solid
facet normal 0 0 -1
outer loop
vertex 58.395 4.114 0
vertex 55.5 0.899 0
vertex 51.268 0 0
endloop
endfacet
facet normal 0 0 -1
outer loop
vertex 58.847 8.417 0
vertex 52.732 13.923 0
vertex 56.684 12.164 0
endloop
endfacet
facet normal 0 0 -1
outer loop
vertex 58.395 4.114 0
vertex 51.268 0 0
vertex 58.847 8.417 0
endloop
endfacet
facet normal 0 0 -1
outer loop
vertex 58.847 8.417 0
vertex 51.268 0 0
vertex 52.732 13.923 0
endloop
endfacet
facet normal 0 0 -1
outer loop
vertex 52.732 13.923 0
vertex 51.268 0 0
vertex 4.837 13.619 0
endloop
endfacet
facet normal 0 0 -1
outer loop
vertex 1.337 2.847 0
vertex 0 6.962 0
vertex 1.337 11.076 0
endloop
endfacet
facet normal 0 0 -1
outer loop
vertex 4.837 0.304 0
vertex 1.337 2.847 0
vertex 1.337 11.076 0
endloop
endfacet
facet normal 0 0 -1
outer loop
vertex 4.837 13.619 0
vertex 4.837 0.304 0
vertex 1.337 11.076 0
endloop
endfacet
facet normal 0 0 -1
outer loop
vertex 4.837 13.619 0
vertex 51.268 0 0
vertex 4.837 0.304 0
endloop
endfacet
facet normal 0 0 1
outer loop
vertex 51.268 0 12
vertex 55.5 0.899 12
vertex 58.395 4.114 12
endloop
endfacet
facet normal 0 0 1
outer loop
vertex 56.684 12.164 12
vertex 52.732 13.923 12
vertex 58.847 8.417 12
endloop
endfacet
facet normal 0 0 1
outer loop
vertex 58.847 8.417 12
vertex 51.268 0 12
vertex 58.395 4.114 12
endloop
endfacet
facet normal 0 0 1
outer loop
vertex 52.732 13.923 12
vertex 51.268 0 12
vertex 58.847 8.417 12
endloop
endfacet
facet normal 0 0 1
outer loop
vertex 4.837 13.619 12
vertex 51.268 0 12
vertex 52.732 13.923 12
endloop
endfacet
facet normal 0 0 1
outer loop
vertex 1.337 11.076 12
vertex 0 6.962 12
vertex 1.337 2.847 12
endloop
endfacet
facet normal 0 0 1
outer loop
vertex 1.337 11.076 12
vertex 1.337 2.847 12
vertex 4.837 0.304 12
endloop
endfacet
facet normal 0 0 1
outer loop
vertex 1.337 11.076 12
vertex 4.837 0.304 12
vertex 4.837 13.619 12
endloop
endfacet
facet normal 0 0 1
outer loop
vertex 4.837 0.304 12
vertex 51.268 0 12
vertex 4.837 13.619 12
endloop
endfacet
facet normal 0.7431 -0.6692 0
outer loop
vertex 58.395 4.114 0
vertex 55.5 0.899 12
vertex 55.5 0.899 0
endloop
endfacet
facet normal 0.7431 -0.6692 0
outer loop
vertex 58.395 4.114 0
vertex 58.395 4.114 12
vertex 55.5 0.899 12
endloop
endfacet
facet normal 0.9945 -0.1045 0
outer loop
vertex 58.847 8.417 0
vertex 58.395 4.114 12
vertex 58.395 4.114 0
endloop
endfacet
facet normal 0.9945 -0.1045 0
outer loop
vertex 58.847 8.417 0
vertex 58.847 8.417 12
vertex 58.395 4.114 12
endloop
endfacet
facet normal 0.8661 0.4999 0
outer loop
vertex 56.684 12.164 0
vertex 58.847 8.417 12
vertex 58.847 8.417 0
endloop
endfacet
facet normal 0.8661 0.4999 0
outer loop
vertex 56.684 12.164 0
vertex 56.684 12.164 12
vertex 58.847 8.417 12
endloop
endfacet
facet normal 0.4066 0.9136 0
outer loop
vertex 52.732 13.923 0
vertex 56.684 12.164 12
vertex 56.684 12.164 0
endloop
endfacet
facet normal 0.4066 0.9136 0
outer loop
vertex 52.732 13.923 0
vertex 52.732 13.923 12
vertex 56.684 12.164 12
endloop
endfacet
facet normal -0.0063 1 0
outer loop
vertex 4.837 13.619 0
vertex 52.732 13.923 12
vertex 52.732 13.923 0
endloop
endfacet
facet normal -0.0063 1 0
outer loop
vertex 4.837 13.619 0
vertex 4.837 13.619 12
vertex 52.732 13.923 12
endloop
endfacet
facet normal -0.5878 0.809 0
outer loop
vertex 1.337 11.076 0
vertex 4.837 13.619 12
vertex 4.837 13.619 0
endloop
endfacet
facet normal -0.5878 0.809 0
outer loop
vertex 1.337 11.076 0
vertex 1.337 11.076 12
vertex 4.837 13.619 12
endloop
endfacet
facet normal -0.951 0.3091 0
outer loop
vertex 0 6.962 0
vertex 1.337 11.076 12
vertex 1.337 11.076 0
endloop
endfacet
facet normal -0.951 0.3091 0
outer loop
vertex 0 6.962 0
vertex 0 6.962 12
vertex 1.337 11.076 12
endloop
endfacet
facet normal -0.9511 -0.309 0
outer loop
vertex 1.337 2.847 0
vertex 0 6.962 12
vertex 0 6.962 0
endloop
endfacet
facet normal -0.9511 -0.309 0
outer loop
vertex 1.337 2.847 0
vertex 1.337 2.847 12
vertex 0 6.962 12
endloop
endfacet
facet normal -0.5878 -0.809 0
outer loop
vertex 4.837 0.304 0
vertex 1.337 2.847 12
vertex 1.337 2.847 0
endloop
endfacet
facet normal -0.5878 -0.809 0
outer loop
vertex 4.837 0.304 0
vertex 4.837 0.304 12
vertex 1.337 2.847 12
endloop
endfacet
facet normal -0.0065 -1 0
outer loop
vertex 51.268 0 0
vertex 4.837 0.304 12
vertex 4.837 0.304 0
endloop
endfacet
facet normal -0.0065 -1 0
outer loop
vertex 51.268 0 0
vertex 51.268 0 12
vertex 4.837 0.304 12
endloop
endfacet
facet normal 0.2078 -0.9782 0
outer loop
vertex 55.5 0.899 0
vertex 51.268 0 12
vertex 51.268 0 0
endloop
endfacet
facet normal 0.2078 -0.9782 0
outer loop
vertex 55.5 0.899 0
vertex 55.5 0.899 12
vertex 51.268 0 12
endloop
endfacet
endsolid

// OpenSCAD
$fn = 32;

// ----------------------------------------------------------------------
// Lever arm: two bosses 14 and 14 mm, 45 mm between centres
// ----------------------------------------------------------------------

// --- parameters (mm) ---
profile_height = 12;      // extrusion height
profile_points = 11;      // points of the closed outline

profile = [[0, 6.962], [1.337, 2.847], [4.837, 0.304], [51.268, 0], [55.5, 0.899], [58.395, 4.114], [58.847, 8.417], [56.684, 12.164], [52.732, 13.923], [4.837, 13.619], [1.337, 11.076]];  // single closed polygon, 11 points, counter clockwise

// --- the one profile operation ---
linear_extrude(height = profile_height) polygon(points = profile);
